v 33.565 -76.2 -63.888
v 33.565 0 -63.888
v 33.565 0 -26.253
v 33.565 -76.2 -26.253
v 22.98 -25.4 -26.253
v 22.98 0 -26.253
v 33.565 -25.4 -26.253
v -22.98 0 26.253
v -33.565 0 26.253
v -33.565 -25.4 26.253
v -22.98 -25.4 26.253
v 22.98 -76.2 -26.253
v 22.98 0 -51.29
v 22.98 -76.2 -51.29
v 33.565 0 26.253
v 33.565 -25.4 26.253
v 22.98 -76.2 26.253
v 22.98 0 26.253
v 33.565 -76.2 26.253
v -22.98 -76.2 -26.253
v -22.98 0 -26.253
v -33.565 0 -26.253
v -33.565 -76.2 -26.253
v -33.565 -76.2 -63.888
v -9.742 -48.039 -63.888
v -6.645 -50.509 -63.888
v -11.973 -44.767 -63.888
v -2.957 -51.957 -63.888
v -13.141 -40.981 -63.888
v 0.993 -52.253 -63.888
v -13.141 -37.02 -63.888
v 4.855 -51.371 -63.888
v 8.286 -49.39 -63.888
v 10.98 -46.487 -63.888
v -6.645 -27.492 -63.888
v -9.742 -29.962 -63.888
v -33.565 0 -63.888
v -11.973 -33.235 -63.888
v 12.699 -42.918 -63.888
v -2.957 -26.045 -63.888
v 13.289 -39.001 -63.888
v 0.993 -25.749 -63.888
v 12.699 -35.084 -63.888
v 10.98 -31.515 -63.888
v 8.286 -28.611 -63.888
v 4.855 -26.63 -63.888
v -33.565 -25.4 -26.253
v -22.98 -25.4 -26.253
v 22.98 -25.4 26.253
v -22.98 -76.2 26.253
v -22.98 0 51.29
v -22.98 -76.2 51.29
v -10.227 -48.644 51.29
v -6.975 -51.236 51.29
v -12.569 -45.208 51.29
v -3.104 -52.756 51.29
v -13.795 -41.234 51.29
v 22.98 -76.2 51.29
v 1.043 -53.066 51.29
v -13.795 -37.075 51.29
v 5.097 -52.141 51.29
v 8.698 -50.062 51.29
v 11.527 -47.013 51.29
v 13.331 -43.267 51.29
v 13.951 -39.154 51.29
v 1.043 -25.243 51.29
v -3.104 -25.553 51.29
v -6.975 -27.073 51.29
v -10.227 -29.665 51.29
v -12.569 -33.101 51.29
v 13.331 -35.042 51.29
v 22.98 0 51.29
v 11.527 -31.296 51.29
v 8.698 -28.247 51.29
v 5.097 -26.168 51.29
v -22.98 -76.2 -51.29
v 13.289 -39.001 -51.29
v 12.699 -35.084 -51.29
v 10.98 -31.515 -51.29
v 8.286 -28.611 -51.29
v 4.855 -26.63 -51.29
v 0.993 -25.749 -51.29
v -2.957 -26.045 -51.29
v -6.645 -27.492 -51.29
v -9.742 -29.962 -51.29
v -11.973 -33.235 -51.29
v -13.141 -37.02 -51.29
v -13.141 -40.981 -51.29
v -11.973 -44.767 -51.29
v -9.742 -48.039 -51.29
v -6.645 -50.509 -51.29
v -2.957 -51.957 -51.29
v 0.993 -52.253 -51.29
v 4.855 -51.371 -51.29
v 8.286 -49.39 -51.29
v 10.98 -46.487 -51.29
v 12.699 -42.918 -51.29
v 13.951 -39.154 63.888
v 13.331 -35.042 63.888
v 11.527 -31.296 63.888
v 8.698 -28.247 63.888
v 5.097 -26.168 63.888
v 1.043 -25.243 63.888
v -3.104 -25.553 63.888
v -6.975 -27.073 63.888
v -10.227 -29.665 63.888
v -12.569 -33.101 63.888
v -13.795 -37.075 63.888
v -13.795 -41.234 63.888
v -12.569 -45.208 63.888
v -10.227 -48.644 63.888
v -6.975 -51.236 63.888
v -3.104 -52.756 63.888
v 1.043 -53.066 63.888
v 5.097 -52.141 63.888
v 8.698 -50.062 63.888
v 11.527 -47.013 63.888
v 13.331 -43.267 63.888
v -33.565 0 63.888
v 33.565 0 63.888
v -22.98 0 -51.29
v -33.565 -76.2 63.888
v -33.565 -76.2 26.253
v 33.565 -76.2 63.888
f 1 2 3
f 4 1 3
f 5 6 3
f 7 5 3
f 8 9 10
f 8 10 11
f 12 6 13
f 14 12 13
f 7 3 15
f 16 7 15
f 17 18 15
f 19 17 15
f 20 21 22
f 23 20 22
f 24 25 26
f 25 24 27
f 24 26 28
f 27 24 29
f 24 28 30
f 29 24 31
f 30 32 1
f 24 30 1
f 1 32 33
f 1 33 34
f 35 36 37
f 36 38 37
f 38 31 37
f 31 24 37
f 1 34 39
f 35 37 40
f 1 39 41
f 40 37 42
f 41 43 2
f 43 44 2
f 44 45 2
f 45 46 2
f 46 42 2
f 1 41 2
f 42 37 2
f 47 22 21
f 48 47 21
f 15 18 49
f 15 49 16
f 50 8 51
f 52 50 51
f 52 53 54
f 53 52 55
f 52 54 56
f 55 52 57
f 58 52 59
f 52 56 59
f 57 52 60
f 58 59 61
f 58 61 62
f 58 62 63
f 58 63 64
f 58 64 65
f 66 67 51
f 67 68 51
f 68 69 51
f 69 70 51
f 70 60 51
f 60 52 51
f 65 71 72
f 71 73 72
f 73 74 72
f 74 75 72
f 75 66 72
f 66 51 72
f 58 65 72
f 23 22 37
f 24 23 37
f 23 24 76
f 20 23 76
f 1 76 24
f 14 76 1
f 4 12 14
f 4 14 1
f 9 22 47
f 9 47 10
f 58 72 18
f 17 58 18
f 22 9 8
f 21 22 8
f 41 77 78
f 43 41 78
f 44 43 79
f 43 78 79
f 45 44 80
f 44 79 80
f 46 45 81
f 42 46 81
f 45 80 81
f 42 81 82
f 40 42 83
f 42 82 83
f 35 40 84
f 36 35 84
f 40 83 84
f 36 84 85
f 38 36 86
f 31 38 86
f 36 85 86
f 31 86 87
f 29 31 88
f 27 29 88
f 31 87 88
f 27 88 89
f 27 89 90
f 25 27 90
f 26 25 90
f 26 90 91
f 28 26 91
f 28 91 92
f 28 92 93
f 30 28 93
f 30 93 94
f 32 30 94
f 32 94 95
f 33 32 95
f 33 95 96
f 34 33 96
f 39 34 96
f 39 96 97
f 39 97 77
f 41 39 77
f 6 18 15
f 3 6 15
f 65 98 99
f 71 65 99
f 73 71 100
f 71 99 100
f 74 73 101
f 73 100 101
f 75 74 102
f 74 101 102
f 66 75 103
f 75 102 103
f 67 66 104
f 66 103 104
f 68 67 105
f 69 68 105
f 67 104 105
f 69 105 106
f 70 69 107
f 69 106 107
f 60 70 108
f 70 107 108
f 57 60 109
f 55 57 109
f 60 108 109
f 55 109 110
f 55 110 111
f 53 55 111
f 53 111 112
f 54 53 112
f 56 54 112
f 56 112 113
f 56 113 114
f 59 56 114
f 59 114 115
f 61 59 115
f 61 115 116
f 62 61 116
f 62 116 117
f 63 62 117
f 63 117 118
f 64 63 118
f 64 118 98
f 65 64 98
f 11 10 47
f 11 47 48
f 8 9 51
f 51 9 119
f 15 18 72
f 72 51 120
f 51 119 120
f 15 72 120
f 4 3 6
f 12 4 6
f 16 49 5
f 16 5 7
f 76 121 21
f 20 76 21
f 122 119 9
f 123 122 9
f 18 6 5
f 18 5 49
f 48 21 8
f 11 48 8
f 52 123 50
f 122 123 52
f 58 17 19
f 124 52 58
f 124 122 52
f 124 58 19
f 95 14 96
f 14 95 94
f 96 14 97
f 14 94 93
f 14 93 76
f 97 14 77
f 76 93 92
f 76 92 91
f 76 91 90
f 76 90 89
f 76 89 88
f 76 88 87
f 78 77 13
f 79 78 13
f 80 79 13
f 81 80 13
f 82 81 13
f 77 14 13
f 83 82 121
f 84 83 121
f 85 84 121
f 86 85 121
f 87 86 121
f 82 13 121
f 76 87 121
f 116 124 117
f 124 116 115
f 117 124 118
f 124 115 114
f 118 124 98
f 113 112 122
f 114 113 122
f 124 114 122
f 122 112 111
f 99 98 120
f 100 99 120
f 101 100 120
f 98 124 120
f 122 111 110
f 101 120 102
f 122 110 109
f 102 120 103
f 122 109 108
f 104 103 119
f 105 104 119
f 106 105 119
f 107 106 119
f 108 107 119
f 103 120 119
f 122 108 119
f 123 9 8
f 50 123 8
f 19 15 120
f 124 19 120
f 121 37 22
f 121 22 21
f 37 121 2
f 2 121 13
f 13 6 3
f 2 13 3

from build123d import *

# Parameters (mm, degrees)
F1_DEPTH = 76.2
F2_DEPTH = 76.2
F0_W     = 10.5856359005
F0_H     = 52.5062903762
F3_DEPTH = 25.4
F4_DEPTH = 25.4
F6_START = -13.1920957938
F5_R     = 13.2891198287
F6_DEPTH = 113.8079042062
F7_R     = 13.9509416412
F8_DEPTH = 127


with BuildPart() as f1:
    # F0 (on Front) → F1 (new body)
    with BuildSketch(Plane.XZ):
        Polygon((33.5652679205, 26.2531451881), (33.5652679205, 63.8882219791), (-33.5652679205, 63.8882219791), (-33.5652679205, 26.2531451881), (-22.97963202, 26.2531451881), (-22.97963202, 51.2903295457), (22.97963202, 51.2903295457), (22.97963202, 26.2531451881), align=None)
    extrude(amount=F1_DEPTH)

    # F7 (on face) → F8 (cut)
    with BuildSketch(Plane.XY.offset(63.8882219791)):
        with Locations((0, -39.1544625163)):
            Circle(F7_R)
    extrude(amount=-F8_DEPTH, mode=Mode.SUBTRACT)


with BuildPart() as f2:
    # F0 (on Front) → F2 (new body)
    with BuildSketch(Plane.XZ):
        Polygon((33.5652679205, -63.8882219791), (33.5652679205, -26.2531451881), (22.97963202, -26.2531451881), (22.97963202, -51.2903295457), (-22.97963202, -51.2903295457), (-22.97963202, -26.2531451881), (-33.5652679205, -26.2531451881), (-33.5652679205, -63.8882219791), align=None)
    extrude(amount=F2_DEPTH)

    # F5 (on Top) → F6 (cut)
    with BuildSketch(Plane.XY.offset(F6_START)):
        with Locations((0, -39.0005894005)):
            Circle(F5_R)
    extrude(amount=-F6_DEPTH, mode=Mode.SUBTRACT)


with BuildPart() as f3:
    # F0 (on Front) → F3 (new body)
    with BuildSketch(Plane.XZ):
        with Locations((-28.2724499702, 0)):
            Rectangle(F0_W, F0_H)
    extrude(amount=F3_DEPTH)


with BuildPart() as f4:
    # F0 (on Front) → F4 (new body)
    with BuildSketch(Plane.XZ):
        with Locations((28.2724499702, 0)):
            Rectangle(F0_W, F0_H)
    extrude(amount=F4_DEPTH)


solid = Compound([f1.part, f2.part, f3.part, f4.part])
